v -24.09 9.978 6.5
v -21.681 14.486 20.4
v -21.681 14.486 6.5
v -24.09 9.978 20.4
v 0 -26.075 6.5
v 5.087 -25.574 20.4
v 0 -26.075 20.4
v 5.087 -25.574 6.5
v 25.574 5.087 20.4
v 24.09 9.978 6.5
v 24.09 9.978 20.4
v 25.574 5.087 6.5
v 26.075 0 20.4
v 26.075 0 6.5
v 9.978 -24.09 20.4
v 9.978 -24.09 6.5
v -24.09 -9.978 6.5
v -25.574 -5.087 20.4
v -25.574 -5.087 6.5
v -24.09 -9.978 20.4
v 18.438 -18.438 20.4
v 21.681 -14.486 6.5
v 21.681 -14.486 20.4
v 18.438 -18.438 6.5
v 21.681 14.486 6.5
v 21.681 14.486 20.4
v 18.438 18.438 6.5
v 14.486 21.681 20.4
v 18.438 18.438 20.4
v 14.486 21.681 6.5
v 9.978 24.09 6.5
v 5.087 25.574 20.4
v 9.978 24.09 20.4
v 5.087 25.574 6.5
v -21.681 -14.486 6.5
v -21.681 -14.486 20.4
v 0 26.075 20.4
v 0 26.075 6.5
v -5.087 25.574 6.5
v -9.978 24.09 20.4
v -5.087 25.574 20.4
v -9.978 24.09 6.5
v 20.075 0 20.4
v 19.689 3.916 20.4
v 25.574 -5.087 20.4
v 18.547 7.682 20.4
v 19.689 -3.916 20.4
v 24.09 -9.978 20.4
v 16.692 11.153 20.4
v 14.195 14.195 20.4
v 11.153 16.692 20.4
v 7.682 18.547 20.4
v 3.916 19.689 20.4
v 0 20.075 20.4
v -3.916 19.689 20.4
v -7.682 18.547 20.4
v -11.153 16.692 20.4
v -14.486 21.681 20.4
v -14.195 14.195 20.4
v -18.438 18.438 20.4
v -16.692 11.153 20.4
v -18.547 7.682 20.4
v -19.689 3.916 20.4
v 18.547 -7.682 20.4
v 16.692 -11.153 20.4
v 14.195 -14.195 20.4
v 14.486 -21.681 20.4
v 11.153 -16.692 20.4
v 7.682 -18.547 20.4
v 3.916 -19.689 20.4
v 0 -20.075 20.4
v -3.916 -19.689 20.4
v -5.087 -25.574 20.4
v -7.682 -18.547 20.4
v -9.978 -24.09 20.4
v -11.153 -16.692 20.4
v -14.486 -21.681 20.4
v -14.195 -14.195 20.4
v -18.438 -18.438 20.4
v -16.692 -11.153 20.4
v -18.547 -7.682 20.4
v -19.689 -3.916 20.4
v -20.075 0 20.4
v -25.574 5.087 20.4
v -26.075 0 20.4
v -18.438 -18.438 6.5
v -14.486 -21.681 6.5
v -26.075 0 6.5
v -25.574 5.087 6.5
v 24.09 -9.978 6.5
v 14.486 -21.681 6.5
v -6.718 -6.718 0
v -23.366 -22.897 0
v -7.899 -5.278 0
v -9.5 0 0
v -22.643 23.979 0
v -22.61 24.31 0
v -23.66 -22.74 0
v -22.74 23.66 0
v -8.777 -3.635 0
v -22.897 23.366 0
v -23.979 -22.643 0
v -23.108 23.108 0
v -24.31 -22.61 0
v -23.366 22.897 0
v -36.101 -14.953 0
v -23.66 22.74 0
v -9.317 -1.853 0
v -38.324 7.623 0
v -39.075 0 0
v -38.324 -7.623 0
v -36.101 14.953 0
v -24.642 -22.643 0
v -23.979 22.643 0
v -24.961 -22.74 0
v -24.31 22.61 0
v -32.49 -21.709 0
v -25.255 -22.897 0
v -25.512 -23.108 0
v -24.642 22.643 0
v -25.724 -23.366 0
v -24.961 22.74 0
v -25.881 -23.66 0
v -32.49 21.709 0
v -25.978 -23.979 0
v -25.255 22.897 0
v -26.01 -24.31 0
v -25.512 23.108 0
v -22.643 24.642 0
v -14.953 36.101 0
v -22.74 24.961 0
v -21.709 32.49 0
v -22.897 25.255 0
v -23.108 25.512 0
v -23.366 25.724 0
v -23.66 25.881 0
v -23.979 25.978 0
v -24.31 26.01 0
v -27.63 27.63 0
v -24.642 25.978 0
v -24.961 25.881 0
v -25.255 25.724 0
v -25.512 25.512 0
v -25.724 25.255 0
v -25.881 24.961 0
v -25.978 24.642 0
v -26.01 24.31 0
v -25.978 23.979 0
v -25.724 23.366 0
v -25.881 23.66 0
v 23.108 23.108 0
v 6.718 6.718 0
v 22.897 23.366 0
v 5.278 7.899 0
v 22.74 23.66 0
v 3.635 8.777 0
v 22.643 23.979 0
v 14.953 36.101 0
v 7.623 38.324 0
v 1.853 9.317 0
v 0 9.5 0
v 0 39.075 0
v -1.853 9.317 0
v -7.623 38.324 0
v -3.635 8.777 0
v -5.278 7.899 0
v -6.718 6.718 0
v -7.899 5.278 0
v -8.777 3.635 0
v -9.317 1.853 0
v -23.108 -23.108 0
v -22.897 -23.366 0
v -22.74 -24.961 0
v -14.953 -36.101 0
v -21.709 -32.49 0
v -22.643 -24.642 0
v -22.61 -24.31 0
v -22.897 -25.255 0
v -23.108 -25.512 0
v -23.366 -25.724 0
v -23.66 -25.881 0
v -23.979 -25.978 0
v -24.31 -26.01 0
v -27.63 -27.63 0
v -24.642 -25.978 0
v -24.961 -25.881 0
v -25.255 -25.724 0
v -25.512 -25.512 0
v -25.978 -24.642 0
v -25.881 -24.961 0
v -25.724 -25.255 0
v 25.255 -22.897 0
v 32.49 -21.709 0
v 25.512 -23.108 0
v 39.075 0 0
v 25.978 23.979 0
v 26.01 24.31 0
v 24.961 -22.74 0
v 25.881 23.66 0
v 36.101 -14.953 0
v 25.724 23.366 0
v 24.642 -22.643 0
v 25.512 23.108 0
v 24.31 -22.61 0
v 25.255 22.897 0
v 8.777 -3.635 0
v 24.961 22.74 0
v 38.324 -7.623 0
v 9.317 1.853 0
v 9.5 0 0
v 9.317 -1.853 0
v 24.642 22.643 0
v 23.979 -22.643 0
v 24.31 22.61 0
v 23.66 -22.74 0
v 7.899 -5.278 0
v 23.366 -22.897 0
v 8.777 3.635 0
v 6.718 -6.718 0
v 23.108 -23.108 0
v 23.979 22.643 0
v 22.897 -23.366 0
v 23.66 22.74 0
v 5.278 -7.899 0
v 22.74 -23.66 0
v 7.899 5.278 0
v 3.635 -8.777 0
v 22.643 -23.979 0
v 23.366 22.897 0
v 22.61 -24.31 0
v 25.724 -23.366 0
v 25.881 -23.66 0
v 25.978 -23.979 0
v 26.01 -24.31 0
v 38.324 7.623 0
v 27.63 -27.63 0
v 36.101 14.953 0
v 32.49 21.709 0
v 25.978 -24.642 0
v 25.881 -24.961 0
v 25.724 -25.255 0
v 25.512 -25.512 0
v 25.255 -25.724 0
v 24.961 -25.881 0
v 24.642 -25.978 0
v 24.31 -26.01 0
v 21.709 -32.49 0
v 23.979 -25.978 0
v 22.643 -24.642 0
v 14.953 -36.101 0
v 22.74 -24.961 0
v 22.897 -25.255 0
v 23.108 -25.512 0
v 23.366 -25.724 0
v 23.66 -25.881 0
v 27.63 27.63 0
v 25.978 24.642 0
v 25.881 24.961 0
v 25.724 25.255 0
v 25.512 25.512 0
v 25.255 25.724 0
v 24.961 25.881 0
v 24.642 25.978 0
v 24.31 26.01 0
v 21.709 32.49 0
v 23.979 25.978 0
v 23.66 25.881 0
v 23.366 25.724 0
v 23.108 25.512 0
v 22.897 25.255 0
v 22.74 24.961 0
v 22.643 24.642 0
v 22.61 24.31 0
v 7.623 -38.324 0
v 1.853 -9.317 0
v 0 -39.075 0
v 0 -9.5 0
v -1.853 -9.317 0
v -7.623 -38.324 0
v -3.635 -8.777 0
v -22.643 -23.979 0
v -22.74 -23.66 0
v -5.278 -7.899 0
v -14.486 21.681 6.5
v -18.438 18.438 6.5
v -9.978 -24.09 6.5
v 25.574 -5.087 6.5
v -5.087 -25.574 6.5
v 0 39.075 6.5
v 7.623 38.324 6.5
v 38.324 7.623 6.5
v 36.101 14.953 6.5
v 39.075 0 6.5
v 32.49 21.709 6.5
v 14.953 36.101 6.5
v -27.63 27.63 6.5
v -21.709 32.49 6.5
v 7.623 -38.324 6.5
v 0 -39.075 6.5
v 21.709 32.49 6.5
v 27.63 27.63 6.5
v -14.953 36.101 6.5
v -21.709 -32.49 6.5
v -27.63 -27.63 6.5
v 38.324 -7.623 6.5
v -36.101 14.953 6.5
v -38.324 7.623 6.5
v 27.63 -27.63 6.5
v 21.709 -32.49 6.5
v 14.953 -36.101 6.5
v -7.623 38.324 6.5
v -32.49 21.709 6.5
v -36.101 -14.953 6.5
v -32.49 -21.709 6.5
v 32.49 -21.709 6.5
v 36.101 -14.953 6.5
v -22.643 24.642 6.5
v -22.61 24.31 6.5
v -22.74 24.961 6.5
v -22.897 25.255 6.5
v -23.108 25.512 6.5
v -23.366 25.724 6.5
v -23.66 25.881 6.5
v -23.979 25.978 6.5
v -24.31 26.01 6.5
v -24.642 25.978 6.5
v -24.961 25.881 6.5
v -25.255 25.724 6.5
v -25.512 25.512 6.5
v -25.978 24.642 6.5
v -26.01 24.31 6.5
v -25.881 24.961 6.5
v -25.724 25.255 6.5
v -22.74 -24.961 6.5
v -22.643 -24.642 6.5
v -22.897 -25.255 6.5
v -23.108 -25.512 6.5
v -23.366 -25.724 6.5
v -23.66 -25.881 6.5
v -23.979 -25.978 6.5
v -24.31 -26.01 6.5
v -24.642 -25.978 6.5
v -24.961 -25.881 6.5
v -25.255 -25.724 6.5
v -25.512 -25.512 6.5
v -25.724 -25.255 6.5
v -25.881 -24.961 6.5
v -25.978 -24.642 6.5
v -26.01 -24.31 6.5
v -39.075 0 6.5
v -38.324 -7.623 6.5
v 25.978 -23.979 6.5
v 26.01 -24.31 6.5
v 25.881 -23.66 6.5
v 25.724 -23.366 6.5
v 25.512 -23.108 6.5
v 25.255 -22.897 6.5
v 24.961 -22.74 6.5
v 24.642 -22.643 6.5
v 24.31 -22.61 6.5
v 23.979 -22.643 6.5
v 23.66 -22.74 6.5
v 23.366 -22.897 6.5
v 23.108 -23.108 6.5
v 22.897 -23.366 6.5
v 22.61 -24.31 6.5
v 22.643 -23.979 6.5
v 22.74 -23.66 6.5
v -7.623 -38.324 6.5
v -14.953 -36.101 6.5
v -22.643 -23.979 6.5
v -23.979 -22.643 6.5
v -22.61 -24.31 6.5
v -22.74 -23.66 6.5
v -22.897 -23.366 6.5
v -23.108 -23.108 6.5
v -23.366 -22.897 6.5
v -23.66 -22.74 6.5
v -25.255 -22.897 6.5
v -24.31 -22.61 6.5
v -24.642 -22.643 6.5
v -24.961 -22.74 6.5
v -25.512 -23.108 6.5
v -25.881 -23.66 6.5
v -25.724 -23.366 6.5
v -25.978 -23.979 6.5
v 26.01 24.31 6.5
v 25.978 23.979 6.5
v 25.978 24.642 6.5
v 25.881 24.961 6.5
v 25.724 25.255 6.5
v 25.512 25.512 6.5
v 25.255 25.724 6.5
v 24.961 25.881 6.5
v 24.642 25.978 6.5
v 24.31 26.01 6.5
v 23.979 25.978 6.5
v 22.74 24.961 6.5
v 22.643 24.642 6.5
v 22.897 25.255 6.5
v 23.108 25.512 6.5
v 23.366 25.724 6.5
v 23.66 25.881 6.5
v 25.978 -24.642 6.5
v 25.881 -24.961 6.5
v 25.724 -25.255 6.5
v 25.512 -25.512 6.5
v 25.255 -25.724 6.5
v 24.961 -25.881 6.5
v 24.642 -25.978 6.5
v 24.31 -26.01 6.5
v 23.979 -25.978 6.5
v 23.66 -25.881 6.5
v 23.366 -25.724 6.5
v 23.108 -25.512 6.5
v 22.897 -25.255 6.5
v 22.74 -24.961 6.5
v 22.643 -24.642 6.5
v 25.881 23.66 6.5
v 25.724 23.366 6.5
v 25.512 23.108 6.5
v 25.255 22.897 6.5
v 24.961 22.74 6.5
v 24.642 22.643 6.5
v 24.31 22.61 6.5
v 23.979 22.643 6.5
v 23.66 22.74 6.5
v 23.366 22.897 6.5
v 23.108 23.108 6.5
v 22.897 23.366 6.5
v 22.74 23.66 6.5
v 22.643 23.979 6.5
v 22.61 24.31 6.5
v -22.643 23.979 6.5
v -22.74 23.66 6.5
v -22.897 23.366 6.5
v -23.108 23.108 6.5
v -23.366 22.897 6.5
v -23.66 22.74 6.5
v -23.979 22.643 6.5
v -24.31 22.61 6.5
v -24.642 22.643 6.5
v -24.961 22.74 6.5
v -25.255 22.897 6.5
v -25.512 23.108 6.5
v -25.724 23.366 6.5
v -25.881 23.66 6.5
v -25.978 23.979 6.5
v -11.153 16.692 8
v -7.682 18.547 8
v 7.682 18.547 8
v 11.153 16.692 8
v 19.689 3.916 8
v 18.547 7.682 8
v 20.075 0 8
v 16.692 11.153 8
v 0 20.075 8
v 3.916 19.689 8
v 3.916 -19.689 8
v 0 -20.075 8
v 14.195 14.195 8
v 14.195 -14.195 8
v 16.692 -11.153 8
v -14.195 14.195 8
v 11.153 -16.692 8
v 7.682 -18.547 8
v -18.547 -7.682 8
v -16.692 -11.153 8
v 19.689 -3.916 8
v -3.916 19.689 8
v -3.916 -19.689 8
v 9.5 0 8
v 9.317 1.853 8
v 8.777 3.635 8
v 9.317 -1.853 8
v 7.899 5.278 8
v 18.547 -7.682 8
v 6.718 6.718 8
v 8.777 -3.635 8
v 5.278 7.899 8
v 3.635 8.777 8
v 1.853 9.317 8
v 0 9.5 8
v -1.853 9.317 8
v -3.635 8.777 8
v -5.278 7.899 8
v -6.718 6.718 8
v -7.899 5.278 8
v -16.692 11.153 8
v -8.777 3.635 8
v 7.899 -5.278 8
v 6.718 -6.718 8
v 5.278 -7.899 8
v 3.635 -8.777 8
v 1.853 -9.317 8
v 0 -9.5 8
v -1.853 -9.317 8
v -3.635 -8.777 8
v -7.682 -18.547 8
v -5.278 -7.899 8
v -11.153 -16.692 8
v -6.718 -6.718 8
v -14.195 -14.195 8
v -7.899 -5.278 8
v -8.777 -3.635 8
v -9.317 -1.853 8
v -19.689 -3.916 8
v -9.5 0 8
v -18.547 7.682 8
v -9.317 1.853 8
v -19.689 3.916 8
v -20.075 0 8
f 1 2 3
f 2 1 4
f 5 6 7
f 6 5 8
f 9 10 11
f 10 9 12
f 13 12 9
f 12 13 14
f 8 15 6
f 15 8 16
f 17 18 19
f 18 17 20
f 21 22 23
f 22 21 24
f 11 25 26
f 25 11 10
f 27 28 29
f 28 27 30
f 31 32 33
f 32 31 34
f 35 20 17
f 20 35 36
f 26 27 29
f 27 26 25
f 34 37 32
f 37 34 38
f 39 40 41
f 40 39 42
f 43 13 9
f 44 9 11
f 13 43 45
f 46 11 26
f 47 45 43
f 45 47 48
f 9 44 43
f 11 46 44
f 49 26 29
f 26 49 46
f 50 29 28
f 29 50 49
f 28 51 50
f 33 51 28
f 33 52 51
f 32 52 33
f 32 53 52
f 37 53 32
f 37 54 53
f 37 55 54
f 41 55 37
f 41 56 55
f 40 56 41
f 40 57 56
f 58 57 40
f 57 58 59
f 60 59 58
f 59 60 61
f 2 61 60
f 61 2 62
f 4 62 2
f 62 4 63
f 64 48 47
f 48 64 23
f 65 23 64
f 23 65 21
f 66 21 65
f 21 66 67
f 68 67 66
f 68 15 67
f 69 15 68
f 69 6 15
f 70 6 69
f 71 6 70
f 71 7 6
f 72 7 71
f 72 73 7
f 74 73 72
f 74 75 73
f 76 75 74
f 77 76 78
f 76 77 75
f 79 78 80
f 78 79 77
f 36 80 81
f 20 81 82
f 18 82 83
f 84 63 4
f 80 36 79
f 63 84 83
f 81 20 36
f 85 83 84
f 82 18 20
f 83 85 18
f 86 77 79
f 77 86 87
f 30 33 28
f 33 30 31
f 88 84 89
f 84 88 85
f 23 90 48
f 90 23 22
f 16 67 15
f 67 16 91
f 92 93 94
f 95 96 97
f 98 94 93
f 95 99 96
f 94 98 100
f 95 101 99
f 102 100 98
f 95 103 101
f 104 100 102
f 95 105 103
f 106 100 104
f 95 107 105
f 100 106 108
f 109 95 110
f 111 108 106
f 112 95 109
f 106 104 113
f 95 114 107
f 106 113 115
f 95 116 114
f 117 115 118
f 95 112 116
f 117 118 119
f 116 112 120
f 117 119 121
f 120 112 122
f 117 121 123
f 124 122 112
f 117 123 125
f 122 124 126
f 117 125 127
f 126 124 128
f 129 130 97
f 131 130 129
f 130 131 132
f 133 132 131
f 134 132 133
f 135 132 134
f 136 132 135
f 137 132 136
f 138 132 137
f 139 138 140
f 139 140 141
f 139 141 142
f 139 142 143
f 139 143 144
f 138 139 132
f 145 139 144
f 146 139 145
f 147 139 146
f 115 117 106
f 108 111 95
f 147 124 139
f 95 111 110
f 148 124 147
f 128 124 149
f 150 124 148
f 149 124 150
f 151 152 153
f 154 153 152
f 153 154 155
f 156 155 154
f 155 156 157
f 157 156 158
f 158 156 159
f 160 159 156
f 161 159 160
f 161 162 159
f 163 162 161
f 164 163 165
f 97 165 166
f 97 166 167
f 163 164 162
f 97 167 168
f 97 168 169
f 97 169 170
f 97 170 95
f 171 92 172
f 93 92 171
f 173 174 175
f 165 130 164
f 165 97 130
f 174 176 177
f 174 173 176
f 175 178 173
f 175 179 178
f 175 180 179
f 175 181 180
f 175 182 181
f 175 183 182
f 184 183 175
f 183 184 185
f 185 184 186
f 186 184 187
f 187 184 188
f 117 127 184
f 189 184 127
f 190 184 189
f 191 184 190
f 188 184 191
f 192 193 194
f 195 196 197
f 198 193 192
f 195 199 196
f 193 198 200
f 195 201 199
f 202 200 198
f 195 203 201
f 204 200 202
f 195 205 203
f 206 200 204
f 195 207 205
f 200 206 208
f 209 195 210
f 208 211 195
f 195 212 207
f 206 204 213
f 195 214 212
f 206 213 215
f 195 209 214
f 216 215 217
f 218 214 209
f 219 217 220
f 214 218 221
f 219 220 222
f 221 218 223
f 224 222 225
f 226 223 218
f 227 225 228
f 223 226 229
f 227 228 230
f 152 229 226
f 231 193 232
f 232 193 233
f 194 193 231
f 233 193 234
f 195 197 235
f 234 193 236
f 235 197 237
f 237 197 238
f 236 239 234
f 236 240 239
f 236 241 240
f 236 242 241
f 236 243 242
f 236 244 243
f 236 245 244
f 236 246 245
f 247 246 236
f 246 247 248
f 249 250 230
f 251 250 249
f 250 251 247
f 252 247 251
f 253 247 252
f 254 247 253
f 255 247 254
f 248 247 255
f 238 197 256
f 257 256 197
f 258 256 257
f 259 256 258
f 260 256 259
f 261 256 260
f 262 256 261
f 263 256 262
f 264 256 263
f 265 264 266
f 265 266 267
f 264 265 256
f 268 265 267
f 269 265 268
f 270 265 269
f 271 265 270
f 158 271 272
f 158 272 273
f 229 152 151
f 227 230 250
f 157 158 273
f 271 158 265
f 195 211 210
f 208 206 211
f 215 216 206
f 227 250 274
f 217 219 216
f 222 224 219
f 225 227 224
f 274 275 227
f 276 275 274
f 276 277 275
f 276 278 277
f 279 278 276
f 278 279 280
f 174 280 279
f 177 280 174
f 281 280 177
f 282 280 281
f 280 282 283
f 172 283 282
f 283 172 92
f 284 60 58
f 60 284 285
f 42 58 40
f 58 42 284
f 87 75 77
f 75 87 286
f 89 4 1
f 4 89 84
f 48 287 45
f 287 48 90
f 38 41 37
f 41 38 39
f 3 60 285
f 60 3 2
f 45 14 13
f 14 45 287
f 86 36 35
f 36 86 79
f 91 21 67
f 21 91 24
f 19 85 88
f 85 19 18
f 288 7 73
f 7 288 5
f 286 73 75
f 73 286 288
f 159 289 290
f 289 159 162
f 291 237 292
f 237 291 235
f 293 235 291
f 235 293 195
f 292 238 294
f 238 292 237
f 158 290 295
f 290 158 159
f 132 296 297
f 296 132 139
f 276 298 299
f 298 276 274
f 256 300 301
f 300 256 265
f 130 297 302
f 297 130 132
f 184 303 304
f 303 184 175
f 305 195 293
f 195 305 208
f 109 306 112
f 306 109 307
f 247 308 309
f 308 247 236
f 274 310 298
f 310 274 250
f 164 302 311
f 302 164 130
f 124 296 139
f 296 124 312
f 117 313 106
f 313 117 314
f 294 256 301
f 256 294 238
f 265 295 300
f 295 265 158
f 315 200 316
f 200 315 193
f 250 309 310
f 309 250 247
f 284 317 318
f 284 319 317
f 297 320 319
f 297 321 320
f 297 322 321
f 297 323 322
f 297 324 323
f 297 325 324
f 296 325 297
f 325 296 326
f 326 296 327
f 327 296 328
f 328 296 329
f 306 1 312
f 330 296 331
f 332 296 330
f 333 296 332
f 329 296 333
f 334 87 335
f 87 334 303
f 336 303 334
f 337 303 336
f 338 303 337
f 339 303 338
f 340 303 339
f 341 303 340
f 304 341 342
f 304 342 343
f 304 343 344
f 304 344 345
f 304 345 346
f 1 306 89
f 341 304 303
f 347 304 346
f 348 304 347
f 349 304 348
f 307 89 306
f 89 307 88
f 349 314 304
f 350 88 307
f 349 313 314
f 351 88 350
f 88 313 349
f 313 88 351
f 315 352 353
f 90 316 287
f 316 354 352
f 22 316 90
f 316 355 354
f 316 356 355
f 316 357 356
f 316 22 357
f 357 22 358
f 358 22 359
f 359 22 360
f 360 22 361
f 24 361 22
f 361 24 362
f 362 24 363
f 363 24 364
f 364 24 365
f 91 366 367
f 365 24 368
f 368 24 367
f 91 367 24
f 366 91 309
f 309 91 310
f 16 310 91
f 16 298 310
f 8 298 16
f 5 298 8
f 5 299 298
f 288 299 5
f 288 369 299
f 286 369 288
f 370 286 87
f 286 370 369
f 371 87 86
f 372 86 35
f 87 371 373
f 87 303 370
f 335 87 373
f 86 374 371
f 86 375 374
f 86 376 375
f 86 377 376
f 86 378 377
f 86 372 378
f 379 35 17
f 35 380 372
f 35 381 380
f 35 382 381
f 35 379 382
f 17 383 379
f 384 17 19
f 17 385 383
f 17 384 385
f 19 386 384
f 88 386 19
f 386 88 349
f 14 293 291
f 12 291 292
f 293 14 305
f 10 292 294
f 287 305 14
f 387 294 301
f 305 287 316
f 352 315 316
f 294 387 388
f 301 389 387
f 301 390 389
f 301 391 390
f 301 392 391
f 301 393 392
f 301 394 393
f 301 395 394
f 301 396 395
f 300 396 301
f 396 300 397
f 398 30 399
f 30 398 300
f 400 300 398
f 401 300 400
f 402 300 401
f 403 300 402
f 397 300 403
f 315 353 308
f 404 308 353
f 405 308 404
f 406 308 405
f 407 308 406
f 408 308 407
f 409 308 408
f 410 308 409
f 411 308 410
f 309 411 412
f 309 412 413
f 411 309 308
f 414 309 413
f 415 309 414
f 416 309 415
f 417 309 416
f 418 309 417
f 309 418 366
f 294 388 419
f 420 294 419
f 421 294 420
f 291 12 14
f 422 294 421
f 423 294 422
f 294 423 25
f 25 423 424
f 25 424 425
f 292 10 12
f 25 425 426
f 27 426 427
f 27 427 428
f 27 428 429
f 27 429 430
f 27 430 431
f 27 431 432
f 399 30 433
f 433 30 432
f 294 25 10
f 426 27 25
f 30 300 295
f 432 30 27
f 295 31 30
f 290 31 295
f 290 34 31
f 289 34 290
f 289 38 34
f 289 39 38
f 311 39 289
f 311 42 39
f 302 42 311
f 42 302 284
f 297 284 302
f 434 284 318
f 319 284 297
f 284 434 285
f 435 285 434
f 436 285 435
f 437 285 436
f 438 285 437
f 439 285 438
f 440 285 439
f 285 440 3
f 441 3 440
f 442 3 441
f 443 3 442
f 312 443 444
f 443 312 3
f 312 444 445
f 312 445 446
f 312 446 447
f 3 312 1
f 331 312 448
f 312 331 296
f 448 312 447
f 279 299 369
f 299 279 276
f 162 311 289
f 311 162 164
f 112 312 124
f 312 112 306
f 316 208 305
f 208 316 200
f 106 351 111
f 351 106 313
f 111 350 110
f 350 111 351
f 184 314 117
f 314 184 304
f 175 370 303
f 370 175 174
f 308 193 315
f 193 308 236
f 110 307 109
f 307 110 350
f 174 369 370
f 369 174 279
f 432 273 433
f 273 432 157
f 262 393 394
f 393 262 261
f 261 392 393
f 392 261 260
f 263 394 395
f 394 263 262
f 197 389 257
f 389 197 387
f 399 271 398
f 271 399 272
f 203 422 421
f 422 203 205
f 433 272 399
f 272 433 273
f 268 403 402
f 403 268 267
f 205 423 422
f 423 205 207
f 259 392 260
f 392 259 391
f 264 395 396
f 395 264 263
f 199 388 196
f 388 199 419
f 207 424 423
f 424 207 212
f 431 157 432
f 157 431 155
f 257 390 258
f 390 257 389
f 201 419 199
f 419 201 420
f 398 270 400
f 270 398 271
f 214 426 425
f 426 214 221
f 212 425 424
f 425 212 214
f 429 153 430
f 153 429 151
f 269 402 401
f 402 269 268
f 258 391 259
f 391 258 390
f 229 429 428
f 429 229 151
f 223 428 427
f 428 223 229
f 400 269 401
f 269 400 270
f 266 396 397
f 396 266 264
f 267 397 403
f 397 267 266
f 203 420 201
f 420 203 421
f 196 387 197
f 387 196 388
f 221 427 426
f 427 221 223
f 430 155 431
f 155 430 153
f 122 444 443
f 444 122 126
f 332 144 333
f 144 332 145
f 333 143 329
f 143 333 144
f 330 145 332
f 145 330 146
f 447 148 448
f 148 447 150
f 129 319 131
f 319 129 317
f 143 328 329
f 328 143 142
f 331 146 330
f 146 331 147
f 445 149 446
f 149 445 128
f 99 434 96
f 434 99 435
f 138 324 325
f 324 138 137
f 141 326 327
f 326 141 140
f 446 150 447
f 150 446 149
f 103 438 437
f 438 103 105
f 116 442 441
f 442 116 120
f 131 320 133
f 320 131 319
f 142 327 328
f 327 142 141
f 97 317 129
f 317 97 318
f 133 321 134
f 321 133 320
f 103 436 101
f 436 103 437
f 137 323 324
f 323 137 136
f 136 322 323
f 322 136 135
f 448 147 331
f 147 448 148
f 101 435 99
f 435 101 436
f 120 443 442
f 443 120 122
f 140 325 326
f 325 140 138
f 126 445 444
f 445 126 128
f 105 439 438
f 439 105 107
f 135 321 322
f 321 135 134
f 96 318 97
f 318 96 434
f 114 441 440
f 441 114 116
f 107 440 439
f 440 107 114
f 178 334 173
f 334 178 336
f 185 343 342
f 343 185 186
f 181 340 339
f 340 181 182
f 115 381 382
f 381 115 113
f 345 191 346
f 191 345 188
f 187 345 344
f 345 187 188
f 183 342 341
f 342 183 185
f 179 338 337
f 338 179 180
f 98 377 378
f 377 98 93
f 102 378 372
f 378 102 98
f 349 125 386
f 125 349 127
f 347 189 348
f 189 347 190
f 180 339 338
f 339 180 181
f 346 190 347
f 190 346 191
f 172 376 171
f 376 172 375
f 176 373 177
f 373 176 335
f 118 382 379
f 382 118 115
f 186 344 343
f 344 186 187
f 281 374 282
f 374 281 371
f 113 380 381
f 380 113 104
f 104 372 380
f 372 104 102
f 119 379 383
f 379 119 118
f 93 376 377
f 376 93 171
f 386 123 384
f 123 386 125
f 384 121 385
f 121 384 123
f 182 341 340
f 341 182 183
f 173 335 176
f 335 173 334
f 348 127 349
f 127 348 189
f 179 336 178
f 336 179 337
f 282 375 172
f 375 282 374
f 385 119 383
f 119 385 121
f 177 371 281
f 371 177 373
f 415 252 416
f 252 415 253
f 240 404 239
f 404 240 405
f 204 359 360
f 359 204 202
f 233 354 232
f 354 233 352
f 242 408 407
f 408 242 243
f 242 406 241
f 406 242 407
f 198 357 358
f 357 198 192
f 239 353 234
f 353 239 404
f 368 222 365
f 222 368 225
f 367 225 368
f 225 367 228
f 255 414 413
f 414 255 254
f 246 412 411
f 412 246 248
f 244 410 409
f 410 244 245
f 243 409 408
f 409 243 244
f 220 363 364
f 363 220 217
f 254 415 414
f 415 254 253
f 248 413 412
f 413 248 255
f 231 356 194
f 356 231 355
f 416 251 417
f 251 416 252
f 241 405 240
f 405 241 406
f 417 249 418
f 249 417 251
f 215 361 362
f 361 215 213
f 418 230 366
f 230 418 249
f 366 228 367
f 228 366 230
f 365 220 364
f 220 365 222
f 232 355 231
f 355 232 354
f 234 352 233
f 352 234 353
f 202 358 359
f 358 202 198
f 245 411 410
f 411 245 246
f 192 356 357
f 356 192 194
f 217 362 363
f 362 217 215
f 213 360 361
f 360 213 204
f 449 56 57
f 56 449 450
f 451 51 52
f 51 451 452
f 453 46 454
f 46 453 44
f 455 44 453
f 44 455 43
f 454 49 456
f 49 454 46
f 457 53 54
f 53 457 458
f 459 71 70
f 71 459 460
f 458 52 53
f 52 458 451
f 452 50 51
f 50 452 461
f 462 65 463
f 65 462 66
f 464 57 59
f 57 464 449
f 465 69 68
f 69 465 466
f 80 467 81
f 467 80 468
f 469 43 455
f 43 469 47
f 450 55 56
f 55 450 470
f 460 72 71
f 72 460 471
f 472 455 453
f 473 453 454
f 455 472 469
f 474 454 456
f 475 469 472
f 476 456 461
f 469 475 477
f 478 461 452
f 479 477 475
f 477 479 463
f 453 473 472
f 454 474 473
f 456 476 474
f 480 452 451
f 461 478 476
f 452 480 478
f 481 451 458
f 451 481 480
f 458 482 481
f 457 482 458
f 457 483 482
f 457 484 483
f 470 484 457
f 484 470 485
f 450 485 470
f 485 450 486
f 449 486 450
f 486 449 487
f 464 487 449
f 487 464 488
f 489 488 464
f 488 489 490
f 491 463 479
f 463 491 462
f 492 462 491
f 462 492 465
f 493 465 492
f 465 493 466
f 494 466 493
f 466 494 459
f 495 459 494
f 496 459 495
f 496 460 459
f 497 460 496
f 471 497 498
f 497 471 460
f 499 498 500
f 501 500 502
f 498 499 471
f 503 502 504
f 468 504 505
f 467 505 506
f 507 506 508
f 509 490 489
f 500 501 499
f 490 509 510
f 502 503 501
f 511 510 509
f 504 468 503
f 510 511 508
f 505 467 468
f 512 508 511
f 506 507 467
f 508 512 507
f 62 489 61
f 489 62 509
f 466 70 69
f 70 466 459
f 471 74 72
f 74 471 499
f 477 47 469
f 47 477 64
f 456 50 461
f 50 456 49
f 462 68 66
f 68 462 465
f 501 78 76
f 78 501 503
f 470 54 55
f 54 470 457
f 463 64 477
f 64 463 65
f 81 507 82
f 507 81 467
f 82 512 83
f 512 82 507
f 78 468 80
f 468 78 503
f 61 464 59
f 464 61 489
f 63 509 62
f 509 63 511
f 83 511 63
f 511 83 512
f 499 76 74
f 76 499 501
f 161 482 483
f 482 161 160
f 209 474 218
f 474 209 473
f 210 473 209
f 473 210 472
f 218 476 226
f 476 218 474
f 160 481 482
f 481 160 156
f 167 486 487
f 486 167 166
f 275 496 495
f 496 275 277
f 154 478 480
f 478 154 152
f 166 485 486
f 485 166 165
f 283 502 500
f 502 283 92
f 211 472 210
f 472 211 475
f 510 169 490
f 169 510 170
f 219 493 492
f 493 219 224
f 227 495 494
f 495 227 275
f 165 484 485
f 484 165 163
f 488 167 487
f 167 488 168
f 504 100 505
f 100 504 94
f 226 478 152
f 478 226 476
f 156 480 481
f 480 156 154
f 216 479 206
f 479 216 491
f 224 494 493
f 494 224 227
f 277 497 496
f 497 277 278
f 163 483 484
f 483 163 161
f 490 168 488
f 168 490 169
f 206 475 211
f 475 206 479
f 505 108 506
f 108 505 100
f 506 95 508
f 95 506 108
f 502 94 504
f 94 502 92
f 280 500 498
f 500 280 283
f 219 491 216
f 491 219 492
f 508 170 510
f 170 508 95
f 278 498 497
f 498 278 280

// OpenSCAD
$fn = 32;

// ----------------------------------------------------------------------
// Bearing housing: seat for 6203 (40 x 12 mm), 52.15 mm body
// ----------------------------------------------------------------------

// --- parameters (mm) ---
body_od = 52.15;          // housing outside diameter
body_h = 20.4;            // overall housing height
wall = 6;                 // wall thickness
pocket_d = 40.15;         // 6203 seat, 0.15 mm clearance
seat_h = 12.4;            // pocket depth
shoulder = 3;             // shoulder under the bearing
pass_d = 19;              // shaft passage
flange_dia = 78.15;       // mounting flange diameter
flange_t = 5;             // flange thickness
bolt_d = 3.4;             // flange bolt clearance
bolt_r = 34.38;           // flange bolt circle radius

module body() {
  cylinder(h = body_h, d = body_od);
}

module flange() {
  /* flange sunk 1.5 mm into the body */
  cylinder(h = flange_t + 1.5, d = flange_dia);
}

difference() {
  union() {
    body();
    flange();
  }
  translate([0, 0, body_h - seat_h]) cylinder(h = seat_h + 1, d = pocket_d);
  translate([0, 0, -1]) cylinder(h = body_h - seat_h + 1, d = pass_d);
  for (i = [0 : 3]) rotate([0, 0, 45 + i * 90]) translate([bolt_r, 0, -1])
    cylinder(h = flange_t + 3, d = bolt_d);
}
